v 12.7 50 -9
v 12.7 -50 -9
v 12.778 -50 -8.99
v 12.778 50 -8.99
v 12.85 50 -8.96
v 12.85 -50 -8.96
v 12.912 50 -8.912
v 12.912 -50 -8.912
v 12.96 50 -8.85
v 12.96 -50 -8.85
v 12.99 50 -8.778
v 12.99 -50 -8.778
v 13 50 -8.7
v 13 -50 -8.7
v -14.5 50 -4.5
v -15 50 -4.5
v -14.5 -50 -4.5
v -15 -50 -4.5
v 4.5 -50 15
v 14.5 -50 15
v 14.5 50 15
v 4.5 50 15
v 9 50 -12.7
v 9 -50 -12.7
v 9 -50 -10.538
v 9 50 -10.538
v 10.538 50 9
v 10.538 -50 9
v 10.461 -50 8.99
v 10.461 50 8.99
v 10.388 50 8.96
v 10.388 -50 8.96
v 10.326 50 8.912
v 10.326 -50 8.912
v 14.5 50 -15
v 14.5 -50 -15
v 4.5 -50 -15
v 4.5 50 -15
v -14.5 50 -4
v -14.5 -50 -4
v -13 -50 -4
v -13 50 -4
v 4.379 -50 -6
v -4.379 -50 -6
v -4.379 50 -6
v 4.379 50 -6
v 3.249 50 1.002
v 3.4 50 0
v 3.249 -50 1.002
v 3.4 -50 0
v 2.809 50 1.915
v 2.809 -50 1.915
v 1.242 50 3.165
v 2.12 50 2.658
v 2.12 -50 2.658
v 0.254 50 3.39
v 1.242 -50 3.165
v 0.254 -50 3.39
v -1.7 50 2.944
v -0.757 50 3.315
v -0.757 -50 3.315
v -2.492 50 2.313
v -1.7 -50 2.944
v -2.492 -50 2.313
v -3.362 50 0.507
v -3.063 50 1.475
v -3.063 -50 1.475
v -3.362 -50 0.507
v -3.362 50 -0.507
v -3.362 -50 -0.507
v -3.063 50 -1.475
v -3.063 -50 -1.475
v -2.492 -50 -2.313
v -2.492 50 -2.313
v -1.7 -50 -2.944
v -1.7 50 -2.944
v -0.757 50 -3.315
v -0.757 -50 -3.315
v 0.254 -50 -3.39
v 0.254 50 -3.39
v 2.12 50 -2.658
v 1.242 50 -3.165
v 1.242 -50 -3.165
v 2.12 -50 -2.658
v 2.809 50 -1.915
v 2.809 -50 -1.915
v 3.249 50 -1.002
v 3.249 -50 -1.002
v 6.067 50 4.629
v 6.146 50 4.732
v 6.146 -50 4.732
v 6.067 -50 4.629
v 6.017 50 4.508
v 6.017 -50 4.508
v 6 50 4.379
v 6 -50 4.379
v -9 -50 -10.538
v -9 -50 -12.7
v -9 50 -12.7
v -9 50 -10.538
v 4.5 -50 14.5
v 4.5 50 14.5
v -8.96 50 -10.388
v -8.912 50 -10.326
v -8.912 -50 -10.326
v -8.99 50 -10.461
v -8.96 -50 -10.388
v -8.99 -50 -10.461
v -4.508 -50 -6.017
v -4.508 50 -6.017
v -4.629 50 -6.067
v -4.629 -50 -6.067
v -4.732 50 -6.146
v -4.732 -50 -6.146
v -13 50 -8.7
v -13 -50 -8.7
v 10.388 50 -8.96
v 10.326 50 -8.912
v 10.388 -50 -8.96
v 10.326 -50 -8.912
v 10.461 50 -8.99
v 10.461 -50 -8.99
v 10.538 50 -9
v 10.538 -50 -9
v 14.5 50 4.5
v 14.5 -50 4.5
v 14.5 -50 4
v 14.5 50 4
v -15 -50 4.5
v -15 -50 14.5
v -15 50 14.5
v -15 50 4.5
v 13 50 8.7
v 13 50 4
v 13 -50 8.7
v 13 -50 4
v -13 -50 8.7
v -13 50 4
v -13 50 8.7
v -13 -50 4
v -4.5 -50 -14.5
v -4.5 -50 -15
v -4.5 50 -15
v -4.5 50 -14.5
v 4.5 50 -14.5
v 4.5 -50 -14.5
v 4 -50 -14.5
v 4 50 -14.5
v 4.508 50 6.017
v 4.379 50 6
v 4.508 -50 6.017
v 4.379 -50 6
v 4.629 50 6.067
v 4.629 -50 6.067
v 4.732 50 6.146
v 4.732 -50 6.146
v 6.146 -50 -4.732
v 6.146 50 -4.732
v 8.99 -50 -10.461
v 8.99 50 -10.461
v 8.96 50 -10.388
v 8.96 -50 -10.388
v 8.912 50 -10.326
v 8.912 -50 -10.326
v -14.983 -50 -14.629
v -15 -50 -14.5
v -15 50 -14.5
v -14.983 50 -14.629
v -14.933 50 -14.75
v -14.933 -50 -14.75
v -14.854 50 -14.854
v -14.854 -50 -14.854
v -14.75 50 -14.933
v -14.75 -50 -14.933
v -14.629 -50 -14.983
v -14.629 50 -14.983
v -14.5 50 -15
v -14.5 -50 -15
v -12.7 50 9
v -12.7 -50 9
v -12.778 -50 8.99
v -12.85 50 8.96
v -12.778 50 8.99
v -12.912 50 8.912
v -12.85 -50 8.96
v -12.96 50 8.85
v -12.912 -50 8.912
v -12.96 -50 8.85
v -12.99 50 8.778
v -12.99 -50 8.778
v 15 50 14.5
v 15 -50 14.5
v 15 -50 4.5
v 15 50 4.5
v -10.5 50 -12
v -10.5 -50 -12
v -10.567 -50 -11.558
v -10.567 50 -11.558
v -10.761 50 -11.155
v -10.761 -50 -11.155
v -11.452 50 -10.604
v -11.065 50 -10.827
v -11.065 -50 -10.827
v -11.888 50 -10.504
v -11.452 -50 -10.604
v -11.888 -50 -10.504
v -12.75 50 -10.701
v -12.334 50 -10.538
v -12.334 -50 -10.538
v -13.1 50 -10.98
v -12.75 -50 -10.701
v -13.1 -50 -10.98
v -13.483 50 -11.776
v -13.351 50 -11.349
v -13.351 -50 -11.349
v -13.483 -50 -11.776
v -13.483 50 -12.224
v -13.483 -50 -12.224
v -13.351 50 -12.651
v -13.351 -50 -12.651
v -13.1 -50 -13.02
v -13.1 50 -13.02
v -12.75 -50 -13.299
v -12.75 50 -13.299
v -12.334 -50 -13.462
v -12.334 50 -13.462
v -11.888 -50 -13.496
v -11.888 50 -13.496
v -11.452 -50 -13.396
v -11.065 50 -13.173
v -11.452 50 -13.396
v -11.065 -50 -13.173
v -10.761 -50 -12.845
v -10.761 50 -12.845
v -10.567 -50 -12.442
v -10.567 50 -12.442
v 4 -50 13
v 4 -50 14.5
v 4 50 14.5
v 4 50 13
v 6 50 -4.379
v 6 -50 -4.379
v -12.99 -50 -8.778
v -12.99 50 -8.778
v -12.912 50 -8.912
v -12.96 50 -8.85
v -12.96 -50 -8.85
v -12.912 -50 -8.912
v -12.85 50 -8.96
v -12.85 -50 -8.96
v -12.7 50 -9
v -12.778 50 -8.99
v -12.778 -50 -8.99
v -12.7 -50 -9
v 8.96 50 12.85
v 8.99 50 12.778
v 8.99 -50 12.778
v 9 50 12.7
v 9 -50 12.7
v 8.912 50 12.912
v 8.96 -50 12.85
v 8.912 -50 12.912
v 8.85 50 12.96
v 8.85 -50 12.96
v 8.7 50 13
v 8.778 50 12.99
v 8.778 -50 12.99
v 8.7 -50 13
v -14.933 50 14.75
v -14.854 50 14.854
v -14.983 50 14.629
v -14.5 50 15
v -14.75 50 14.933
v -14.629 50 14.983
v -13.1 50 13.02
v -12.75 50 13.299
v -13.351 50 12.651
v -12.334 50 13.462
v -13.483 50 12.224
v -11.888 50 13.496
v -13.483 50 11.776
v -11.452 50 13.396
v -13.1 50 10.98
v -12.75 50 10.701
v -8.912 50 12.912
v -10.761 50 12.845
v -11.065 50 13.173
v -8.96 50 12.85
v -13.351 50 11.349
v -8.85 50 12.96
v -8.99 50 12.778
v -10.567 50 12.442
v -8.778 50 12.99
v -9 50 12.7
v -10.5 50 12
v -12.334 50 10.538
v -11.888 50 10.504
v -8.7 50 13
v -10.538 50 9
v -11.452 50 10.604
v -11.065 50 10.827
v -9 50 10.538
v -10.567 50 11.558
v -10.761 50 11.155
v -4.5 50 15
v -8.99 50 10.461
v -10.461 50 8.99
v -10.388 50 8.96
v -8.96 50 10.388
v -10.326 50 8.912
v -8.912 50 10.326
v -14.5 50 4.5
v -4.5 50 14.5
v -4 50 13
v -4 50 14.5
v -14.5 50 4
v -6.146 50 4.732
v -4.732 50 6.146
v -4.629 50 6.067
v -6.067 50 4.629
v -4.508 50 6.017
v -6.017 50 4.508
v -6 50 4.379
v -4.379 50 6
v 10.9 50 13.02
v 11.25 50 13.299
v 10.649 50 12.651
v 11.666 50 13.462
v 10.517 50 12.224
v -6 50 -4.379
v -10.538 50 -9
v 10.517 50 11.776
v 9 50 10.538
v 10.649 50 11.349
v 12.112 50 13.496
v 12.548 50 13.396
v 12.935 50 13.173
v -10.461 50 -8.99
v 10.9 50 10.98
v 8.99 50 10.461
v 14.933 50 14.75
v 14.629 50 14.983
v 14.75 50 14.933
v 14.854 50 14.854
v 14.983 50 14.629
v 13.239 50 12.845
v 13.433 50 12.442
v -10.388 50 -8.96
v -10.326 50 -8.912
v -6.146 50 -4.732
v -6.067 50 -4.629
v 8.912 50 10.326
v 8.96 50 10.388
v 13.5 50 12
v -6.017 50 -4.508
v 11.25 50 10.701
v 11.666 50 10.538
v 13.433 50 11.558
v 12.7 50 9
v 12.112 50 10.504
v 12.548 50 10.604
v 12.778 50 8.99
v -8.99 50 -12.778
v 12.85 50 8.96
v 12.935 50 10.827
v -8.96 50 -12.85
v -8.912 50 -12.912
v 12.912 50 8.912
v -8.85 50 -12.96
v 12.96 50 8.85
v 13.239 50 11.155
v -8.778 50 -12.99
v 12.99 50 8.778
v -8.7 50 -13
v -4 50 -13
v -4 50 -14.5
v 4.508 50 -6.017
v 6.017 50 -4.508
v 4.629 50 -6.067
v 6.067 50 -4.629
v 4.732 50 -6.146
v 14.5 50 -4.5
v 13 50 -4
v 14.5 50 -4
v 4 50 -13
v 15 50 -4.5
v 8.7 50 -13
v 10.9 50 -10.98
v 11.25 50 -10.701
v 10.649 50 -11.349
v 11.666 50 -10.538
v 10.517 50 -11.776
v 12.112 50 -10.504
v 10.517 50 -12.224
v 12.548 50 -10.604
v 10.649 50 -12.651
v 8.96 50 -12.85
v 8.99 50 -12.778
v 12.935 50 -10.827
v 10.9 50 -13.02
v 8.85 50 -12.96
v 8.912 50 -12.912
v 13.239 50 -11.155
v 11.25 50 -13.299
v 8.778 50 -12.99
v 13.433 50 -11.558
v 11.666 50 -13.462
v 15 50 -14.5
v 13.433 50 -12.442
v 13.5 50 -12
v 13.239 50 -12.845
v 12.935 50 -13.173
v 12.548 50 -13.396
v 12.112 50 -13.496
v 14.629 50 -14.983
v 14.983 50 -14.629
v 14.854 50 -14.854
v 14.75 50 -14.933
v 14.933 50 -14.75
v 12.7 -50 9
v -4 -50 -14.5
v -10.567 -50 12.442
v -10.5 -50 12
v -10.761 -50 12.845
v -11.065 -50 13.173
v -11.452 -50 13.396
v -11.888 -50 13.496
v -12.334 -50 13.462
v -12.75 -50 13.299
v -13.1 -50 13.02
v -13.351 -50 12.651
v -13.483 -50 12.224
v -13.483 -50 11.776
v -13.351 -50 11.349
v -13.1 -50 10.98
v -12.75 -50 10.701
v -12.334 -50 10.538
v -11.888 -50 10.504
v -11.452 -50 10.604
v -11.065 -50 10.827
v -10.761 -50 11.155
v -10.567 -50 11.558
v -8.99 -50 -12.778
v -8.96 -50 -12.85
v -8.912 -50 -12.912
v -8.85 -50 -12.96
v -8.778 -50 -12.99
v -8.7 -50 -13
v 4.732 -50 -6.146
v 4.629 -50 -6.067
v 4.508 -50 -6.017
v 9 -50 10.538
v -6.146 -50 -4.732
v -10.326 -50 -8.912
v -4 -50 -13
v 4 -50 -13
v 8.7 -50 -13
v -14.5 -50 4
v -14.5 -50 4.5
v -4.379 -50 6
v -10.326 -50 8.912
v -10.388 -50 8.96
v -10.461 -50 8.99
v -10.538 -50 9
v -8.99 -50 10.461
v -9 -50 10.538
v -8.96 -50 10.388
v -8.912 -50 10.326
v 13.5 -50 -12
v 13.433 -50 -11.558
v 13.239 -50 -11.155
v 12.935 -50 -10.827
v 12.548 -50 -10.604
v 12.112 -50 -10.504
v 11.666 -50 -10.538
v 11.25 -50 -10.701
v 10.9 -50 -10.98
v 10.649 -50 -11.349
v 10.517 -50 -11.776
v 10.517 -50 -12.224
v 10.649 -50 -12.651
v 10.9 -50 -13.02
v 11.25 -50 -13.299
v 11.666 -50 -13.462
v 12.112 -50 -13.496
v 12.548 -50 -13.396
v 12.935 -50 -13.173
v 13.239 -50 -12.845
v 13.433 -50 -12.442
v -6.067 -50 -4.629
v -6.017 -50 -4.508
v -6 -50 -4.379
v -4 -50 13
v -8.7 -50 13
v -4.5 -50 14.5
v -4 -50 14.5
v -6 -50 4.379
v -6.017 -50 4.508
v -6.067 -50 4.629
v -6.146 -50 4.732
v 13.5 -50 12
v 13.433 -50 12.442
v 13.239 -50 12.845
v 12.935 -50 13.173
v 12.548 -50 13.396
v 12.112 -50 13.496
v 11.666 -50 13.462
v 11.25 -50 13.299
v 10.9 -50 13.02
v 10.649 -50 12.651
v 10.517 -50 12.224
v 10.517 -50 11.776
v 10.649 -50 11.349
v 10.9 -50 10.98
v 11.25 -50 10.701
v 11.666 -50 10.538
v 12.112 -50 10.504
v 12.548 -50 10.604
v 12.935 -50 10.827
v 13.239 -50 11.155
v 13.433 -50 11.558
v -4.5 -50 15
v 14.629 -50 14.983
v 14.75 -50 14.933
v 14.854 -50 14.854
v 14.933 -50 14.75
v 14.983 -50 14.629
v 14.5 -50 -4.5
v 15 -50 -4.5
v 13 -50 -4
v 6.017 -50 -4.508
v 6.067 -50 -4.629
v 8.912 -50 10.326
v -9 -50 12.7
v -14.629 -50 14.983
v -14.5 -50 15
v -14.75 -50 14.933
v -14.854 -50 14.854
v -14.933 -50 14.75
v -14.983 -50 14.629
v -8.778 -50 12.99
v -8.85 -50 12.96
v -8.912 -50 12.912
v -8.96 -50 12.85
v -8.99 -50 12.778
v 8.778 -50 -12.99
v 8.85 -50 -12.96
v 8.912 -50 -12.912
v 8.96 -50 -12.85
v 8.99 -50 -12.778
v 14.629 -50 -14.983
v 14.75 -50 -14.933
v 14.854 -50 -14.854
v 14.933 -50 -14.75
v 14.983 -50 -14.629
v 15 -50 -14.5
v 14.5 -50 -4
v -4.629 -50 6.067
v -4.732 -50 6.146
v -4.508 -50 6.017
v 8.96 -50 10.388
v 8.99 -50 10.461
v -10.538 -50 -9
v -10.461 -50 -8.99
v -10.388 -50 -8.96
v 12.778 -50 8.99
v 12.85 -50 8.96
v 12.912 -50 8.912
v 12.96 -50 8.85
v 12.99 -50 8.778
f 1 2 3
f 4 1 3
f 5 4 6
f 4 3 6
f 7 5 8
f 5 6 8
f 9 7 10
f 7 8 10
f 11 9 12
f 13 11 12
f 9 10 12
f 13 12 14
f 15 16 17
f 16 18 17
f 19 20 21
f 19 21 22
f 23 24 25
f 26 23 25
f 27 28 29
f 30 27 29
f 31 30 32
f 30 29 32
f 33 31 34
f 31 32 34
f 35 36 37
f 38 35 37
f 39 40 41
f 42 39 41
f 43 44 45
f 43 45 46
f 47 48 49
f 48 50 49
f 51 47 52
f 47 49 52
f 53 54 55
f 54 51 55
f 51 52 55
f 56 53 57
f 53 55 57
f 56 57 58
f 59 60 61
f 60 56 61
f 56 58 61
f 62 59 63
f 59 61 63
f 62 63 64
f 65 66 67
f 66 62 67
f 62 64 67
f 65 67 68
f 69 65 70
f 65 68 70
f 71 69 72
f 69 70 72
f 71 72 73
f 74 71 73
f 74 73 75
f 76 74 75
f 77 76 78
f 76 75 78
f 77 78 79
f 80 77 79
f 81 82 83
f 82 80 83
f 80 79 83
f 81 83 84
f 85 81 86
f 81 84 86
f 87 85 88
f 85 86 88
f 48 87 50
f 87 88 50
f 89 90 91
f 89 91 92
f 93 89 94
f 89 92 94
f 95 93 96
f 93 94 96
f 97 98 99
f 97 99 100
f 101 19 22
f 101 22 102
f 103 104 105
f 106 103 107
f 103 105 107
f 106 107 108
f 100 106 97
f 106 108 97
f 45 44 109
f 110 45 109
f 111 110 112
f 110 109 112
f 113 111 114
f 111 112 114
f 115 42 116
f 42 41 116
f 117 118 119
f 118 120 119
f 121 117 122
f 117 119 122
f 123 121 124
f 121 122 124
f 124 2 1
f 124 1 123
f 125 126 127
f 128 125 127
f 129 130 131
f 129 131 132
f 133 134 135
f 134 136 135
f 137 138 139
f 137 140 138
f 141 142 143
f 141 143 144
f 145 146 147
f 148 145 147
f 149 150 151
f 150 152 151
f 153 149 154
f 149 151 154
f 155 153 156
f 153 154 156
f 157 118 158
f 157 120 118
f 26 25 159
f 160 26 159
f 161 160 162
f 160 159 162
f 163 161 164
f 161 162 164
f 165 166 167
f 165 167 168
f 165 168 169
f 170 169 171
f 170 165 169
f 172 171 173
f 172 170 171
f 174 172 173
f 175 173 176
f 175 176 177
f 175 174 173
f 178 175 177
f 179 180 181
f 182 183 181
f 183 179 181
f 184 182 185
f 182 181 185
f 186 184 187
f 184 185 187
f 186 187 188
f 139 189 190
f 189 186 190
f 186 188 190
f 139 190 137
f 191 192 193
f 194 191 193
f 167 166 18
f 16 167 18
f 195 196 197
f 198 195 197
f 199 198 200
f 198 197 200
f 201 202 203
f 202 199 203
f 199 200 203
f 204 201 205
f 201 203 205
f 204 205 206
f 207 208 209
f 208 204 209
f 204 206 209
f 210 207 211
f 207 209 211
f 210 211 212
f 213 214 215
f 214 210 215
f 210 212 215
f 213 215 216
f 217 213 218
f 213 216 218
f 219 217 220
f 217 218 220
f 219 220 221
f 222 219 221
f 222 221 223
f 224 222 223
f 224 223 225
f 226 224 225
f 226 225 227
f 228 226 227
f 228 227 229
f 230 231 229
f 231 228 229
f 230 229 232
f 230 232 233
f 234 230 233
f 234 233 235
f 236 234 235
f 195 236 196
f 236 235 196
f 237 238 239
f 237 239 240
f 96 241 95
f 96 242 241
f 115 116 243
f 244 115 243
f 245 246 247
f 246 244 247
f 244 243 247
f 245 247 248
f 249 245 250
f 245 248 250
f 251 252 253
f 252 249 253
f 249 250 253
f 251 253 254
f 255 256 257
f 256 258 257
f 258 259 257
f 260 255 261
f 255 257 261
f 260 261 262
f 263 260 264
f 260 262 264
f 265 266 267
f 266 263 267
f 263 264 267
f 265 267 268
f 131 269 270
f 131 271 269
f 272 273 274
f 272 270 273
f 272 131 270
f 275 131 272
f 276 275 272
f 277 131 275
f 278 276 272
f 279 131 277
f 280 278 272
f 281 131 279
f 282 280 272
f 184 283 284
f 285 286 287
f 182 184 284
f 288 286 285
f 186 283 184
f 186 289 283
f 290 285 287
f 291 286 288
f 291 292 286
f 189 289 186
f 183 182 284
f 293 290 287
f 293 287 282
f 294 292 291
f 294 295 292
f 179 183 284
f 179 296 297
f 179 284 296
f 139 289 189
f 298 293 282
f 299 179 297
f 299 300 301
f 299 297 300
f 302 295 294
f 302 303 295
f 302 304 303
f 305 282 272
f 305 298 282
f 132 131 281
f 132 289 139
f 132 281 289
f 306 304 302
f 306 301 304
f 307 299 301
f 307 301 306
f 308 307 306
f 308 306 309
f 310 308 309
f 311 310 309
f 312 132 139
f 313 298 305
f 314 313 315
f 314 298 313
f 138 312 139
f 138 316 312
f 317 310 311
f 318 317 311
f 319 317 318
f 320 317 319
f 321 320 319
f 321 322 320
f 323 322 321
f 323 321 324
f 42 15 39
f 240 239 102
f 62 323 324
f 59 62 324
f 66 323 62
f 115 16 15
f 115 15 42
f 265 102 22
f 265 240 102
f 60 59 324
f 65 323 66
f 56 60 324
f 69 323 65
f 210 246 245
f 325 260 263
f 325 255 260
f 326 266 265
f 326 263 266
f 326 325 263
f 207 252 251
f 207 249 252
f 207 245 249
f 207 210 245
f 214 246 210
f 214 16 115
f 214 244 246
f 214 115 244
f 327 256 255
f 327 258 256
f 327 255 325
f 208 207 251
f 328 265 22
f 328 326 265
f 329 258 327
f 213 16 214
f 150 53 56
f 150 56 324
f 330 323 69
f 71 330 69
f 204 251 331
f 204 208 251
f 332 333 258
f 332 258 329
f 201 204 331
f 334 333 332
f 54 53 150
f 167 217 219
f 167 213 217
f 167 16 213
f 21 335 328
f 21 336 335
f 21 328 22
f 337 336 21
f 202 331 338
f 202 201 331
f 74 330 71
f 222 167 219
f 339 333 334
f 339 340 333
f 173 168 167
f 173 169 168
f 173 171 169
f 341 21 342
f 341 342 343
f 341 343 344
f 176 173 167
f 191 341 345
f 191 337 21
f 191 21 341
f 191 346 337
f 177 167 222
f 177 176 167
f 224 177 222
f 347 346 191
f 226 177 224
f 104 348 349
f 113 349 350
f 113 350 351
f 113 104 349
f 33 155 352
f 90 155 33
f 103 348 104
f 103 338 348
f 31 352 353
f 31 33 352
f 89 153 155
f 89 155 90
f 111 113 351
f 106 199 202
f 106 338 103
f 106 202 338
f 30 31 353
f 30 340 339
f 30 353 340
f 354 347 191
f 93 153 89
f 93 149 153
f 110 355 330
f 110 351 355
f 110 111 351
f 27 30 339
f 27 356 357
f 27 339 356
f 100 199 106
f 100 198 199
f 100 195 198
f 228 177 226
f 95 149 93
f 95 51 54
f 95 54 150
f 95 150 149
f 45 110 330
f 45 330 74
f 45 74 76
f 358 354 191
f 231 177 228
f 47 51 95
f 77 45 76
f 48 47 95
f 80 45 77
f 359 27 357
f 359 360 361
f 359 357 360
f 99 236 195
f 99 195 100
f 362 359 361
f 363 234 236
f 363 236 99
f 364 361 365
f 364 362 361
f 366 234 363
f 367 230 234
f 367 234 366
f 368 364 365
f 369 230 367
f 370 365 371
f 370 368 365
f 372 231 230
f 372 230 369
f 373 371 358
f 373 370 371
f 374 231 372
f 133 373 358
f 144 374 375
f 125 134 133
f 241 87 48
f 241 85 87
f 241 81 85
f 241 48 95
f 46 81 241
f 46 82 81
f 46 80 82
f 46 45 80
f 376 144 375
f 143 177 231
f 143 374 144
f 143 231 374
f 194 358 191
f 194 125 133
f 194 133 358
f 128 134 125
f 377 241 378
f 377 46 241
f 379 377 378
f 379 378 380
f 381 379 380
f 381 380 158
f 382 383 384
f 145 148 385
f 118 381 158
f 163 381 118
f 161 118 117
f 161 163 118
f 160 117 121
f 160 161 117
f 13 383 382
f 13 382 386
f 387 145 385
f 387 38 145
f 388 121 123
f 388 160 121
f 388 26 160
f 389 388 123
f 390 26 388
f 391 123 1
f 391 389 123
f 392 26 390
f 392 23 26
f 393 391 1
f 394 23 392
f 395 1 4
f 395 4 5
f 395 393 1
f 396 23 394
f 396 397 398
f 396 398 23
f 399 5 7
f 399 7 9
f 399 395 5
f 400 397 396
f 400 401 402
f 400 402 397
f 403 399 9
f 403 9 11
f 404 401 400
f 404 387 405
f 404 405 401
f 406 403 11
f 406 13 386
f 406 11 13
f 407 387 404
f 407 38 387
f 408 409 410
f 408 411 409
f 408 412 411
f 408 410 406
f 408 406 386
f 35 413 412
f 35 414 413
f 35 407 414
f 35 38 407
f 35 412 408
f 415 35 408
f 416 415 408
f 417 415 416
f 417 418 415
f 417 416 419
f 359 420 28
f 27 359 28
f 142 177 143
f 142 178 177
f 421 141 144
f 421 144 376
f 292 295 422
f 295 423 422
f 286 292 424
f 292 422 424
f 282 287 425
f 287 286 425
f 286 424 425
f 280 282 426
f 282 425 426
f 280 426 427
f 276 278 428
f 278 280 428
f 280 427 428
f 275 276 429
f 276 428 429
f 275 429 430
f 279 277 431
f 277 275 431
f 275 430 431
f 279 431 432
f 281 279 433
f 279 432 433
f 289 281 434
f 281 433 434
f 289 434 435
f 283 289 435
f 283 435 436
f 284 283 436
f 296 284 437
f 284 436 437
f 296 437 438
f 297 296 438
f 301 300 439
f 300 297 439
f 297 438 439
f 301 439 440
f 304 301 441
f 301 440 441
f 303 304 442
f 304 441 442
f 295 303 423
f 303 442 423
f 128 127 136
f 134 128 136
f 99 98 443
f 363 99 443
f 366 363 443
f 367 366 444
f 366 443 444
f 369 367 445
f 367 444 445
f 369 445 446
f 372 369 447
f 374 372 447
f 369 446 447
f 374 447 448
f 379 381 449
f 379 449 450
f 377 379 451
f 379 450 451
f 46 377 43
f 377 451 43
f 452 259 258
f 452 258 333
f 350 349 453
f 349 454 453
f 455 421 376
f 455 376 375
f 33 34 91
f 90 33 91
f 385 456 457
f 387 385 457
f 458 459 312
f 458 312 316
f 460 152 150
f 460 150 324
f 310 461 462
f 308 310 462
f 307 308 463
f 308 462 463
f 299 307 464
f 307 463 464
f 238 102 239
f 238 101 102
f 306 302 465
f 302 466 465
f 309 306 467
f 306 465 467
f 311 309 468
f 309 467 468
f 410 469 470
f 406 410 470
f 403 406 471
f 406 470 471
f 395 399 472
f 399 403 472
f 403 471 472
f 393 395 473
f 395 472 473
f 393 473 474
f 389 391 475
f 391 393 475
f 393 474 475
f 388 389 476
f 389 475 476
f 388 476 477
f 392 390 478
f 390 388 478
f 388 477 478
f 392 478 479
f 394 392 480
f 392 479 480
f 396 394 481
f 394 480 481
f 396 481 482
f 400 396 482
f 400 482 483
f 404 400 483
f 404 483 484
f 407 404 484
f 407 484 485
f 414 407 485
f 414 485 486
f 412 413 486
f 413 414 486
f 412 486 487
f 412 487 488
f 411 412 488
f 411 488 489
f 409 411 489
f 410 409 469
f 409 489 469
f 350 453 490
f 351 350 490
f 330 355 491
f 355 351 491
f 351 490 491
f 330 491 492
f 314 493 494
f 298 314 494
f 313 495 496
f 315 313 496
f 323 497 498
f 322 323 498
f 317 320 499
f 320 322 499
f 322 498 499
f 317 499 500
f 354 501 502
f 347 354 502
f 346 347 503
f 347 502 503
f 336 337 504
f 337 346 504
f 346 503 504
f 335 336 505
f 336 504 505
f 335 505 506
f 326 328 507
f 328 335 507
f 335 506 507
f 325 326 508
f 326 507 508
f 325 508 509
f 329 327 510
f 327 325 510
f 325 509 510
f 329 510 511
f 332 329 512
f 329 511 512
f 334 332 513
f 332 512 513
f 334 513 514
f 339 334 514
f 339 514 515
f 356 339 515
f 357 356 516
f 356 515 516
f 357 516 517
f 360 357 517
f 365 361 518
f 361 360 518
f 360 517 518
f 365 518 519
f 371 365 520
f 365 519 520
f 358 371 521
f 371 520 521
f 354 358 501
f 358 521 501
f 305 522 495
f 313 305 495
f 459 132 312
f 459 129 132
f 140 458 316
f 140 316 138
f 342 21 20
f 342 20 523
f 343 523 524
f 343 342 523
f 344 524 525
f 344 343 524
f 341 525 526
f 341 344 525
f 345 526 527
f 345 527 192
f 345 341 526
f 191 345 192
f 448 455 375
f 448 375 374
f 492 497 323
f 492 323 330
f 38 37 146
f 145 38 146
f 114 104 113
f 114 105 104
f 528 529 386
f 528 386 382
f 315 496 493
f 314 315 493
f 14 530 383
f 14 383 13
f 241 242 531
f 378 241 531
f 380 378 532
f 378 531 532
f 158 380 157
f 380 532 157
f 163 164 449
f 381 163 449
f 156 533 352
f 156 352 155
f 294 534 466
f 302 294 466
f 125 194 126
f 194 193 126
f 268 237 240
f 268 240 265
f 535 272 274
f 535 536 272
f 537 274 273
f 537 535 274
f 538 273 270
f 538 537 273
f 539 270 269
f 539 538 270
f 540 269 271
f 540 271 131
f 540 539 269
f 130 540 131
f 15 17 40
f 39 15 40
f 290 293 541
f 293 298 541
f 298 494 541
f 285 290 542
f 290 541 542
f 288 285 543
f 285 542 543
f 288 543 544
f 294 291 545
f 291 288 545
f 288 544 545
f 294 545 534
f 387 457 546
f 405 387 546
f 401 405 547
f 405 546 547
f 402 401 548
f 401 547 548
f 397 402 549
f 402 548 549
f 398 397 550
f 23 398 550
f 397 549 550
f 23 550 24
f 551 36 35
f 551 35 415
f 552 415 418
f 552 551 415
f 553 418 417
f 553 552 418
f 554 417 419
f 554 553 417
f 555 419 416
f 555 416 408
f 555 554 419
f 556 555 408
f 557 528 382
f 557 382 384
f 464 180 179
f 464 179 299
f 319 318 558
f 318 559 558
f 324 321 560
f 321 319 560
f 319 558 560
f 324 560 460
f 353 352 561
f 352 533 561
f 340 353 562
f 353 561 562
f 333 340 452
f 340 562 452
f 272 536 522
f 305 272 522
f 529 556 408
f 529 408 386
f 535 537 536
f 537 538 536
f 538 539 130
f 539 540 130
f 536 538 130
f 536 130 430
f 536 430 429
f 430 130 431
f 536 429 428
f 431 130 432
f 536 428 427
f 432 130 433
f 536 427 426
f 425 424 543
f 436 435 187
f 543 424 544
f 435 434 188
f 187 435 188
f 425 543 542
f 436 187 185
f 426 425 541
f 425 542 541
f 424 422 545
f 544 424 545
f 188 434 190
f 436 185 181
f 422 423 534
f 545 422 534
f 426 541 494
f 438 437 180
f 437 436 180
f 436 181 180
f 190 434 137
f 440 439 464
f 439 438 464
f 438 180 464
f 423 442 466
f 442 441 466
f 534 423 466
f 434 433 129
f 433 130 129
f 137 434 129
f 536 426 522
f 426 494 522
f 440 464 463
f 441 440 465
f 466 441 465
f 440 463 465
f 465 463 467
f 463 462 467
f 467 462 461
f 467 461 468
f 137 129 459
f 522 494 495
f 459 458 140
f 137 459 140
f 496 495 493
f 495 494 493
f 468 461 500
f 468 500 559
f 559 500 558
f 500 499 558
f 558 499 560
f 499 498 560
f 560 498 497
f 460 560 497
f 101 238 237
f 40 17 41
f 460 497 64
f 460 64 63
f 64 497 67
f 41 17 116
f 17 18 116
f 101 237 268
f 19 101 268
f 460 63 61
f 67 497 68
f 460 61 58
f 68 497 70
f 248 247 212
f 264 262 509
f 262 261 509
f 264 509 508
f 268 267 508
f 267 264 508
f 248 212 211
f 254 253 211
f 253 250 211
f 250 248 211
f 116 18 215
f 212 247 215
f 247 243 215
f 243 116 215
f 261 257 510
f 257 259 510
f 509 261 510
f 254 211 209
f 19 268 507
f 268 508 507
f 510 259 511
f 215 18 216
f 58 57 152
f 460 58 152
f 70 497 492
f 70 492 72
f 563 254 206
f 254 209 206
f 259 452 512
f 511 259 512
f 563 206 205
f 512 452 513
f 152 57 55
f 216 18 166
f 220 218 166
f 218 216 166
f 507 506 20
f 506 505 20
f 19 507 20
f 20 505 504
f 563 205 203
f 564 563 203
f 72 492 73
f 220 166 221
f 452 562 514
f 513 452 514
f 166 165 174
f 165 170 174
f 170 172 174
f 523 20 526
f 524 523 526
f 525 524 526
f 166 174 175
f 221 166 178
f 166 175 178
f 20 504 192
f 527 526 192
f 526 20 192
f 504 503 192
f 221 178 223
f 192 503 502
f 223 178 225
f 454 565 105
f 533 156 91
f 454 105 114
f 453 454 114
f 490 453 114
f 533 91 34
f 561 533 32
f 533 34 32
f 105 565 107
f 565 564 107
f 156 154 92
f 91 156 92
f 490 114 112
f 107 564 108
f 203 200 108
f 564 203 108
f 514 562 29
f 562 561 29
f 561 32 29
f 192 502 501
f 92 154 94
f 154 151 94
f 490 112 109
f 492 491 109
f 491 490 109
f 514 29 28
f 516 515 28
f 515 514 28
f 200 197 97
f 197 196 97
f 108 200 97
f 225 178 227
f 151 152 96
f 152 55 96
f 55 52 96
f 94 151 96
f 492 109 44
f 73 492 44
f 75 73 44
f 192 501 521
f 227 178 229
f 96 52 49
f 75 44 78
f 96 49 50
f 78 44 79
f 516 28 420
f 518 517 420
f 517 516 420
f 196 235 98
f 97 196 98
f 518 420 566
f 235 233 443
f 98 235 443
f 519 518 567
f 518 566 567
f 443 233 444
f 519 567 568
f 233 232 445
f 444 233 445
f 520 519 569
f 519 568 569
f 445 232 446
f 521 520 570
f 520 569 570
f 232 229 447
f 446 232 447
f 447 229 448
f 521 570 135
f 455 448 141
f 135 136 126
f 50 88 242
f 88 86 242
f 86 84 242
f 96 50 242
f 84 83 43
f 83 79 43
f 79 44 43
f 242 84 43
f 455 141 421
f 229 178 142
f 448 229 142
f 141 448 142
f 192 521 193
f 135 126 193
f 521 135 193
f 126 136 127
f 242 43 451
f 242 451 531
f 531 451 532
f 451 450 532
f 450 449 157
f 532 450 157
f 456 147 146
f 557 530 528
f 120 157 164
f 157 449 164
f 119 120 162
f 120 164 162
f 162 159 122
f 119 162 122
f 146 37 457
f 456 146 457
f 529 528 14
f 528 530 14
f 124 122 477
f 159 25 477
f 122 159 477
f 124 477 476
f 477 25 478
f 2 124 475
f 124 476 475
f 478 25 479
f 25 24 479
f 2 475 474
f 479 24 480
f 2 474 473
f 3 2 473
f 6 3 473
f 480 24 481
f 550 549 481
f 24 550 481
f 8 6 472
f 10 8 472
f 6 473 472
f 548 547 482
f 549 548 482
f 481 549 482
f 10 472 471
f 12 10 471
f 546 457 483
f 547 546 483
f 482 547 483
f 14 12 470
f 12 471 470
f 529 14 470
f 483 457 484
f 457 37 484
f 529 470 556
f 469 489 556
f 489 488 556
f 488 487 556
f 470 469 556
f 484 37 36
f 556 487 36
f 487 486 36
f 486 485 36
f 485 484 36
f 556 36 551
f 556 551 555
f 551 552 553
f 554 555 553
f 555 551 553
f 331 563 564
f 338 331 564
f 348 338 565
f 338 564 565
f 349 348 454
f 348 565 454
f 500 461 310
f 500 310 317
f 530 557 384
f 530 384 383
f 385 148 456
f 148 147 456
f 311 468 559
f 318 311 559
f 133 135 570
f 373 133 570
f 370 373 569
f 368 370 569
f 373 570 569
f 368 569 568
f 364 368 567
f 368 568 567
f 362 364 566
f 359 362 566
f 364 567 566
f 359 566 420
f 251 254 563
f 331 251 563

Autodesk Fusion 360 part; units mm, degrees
sketch "Sketch1" plane through (0, 0, 0) normal (0, 1, 0) x (1, 0, 0)
  circle A0 centre (0, 0) radius 3.4
  line L0 (15, -15) -> (4.5, -15)
  line L1 (4.5, -15) -> (4.5, -14.5)
  line L2 (4.5, -14.5) -> (4, -14.5)
  line L3 (4, -14.5) -> (4, -13)
  line L4 (4, -13) -> (9, -13)
  line L5 (15, -15) -> (15, -4.5)
  line L6 (15, -4.5) -> (14.5, -4.5)
  line L7 (14.5, -4.5) -> (14.5, -4)
  line L8 (14.5, -4) -> (13, -4)
  line L9 (13, -4) -> (13, -9)
  line L10 (13, -9) -> (10.4142, -9)
  line L11 (9, -13) -> (9, -10.4142)
  line L12 (9, -10.4142) -> (4.5858, -6)
  line L13 (10.4142, -9) -> (6, -4.5858)
  line L14 (13, 4) -> (13, 9)
  line L15 (14.5, 4) -> (13, 4)
  line L16 (9, 10.4142) -> (4.5858, 6)
  line L17 (15, 4.5) -> (14.5, 4.5)
  line L18 (4.5, 15) -> (4.5, 14.5)
  line L19 (4, 14.5) -> (4, 13)
  line L20 (10.4142, 9) -> (6, 4.5858)
  line L21 (13, 9) -> (10.4142, 9)
  line L22 (15, 15) -> (4.5, 15)
  line L23 (4, 13) -> (9, 13)
  line L24 (4.5, 14.5) -> (4, 14.5)
  line L25 (15, 15) -> (15, 4.5)
  line L26 (14.5, 4.5) -> (14.5, 4)
  line L27 (9, 13) -> (9, 10.4142)
  line L28 (-4, 13) -> (-9, 13)
  line L29 (-4, 14.5) -> (-4, 13)
  line L30 (-10.4142, 9) -> (-6, 4.5858)
  line L31 (-4.5, 15) -> (-4.5, 14.5)
  line L32 (-15, 4.5) -> (-14.5, 4.5)
  line L33 (-14.5, 4) -> (-13, 4)
  line L34 (-9, 10.4142) -> (-4.5858, 6)
  line L35 (-9, 13) -> (-9, 10.4142)
  line L36 (-15, 15) -> (-15, 4.5)
  line L37 (-13, 4) -> (-13, 9)
  line L38 (-14.5, 4.5) -> (-14.5, 4)
  line L39 (-15, 15) -> (-4.5, 15)
  line L40 (-4.5, 14.5) -> (-4, 14.5)
  line L41 (-13, 9) -> (-10.4142, 9)
  line L42 (-13, -4) -> (-13, -9)
  line L43 (-14.5, -4) -> (-13, -4)
  line L44 (-9, -10.4142) -> (-4.5858, -6)
  line L45 (-15, -4.5) -> (-14.5, -4.5)
  line L46 (-4.5, -15) -> (-4.5, -14.5)
  line L47 (-4, -14.5) -> (-4, -13)
  line L48 (-10.4142, -9) -> (-6, -4.5858)
  line L49 (-13, -9) -> (-10.4142, -9)
  line L50 (-15, -15) -> (-4.5, -15)
  line L51 (-4, -13) -> (-9, -13)
  line L52 (-4.5, -14.5) -> (-4, -14.5)
  line L53 (-15, -15) -> (-15, -4.5)
  line L54 (-14.5, -4.5) -> (-14.5, -4)
  line L55 (-9, -13) -> (-9, -10.4142)
  line L56 (4.5858, -6) -> (-4.5858, -6)
  line L57 (-6, -4.5858) -> (-6, 4.5858)
  line L58 (-4.5858, 6) -> (4.5858, 6)
  line L59 (6, 4.5858) -> (6, -4.5858)
  circle A1 centre (12, -12) radius 1.5
  circle A2 centre (12, 12) radius 1.5
  circle A3 centre (-12, 12) radius 1.5
  circle A4 centre (-12, -12) radius 1.5
  dimension "d1" = 6.8
  dimension "d7" = 360
  dimension "d8" = 3
  dimension "d9" = 8
  dimension "d10" = 30
  dimension "d11" = 12
  dimension "d22" = 18
  dimension "d23" = 2
  dimension "d24" = 7
extrude "Extrude1" add sketch "Sketch1" along normal mid plane 100
fillet "Fillet1" radius 0.5 4 edges at (-15, 0, 15) (15, 0, 15) (-15, 0, -15) (15, 0, -15)
fillet "Fillet2" radius 0.3 8 edges at (-13, 0, -9) (-9, 0, -13) (9, 0, -13) (13, 0, -9) (13, 0, 9) (9, 0, 13) (-9, 0, 13) (-13, 0, 9)
fillet "Fillet3" radius 0.3 8 edges at (-10.4142, 0, -9) (-9, 0, -10.4142) (9, 0, -10.4142) (10.4142, 0, -9) (-9, 0, 10.4142) (-10.4142, 0, 9) (9, 0, 10.4142) (10.4142, 0, 9)
fillet "Fillet4" radius 0.5 8 edges at (-4.5858, 0, 6) (6, 0, 4.5858) (6, 0, -4.5858) (4.5858, 0, 6) (-6, 0, 4.5858) (-6, 0, -4.5858) (4.5858, 0, -6) (-4.5858, 0, -6)
